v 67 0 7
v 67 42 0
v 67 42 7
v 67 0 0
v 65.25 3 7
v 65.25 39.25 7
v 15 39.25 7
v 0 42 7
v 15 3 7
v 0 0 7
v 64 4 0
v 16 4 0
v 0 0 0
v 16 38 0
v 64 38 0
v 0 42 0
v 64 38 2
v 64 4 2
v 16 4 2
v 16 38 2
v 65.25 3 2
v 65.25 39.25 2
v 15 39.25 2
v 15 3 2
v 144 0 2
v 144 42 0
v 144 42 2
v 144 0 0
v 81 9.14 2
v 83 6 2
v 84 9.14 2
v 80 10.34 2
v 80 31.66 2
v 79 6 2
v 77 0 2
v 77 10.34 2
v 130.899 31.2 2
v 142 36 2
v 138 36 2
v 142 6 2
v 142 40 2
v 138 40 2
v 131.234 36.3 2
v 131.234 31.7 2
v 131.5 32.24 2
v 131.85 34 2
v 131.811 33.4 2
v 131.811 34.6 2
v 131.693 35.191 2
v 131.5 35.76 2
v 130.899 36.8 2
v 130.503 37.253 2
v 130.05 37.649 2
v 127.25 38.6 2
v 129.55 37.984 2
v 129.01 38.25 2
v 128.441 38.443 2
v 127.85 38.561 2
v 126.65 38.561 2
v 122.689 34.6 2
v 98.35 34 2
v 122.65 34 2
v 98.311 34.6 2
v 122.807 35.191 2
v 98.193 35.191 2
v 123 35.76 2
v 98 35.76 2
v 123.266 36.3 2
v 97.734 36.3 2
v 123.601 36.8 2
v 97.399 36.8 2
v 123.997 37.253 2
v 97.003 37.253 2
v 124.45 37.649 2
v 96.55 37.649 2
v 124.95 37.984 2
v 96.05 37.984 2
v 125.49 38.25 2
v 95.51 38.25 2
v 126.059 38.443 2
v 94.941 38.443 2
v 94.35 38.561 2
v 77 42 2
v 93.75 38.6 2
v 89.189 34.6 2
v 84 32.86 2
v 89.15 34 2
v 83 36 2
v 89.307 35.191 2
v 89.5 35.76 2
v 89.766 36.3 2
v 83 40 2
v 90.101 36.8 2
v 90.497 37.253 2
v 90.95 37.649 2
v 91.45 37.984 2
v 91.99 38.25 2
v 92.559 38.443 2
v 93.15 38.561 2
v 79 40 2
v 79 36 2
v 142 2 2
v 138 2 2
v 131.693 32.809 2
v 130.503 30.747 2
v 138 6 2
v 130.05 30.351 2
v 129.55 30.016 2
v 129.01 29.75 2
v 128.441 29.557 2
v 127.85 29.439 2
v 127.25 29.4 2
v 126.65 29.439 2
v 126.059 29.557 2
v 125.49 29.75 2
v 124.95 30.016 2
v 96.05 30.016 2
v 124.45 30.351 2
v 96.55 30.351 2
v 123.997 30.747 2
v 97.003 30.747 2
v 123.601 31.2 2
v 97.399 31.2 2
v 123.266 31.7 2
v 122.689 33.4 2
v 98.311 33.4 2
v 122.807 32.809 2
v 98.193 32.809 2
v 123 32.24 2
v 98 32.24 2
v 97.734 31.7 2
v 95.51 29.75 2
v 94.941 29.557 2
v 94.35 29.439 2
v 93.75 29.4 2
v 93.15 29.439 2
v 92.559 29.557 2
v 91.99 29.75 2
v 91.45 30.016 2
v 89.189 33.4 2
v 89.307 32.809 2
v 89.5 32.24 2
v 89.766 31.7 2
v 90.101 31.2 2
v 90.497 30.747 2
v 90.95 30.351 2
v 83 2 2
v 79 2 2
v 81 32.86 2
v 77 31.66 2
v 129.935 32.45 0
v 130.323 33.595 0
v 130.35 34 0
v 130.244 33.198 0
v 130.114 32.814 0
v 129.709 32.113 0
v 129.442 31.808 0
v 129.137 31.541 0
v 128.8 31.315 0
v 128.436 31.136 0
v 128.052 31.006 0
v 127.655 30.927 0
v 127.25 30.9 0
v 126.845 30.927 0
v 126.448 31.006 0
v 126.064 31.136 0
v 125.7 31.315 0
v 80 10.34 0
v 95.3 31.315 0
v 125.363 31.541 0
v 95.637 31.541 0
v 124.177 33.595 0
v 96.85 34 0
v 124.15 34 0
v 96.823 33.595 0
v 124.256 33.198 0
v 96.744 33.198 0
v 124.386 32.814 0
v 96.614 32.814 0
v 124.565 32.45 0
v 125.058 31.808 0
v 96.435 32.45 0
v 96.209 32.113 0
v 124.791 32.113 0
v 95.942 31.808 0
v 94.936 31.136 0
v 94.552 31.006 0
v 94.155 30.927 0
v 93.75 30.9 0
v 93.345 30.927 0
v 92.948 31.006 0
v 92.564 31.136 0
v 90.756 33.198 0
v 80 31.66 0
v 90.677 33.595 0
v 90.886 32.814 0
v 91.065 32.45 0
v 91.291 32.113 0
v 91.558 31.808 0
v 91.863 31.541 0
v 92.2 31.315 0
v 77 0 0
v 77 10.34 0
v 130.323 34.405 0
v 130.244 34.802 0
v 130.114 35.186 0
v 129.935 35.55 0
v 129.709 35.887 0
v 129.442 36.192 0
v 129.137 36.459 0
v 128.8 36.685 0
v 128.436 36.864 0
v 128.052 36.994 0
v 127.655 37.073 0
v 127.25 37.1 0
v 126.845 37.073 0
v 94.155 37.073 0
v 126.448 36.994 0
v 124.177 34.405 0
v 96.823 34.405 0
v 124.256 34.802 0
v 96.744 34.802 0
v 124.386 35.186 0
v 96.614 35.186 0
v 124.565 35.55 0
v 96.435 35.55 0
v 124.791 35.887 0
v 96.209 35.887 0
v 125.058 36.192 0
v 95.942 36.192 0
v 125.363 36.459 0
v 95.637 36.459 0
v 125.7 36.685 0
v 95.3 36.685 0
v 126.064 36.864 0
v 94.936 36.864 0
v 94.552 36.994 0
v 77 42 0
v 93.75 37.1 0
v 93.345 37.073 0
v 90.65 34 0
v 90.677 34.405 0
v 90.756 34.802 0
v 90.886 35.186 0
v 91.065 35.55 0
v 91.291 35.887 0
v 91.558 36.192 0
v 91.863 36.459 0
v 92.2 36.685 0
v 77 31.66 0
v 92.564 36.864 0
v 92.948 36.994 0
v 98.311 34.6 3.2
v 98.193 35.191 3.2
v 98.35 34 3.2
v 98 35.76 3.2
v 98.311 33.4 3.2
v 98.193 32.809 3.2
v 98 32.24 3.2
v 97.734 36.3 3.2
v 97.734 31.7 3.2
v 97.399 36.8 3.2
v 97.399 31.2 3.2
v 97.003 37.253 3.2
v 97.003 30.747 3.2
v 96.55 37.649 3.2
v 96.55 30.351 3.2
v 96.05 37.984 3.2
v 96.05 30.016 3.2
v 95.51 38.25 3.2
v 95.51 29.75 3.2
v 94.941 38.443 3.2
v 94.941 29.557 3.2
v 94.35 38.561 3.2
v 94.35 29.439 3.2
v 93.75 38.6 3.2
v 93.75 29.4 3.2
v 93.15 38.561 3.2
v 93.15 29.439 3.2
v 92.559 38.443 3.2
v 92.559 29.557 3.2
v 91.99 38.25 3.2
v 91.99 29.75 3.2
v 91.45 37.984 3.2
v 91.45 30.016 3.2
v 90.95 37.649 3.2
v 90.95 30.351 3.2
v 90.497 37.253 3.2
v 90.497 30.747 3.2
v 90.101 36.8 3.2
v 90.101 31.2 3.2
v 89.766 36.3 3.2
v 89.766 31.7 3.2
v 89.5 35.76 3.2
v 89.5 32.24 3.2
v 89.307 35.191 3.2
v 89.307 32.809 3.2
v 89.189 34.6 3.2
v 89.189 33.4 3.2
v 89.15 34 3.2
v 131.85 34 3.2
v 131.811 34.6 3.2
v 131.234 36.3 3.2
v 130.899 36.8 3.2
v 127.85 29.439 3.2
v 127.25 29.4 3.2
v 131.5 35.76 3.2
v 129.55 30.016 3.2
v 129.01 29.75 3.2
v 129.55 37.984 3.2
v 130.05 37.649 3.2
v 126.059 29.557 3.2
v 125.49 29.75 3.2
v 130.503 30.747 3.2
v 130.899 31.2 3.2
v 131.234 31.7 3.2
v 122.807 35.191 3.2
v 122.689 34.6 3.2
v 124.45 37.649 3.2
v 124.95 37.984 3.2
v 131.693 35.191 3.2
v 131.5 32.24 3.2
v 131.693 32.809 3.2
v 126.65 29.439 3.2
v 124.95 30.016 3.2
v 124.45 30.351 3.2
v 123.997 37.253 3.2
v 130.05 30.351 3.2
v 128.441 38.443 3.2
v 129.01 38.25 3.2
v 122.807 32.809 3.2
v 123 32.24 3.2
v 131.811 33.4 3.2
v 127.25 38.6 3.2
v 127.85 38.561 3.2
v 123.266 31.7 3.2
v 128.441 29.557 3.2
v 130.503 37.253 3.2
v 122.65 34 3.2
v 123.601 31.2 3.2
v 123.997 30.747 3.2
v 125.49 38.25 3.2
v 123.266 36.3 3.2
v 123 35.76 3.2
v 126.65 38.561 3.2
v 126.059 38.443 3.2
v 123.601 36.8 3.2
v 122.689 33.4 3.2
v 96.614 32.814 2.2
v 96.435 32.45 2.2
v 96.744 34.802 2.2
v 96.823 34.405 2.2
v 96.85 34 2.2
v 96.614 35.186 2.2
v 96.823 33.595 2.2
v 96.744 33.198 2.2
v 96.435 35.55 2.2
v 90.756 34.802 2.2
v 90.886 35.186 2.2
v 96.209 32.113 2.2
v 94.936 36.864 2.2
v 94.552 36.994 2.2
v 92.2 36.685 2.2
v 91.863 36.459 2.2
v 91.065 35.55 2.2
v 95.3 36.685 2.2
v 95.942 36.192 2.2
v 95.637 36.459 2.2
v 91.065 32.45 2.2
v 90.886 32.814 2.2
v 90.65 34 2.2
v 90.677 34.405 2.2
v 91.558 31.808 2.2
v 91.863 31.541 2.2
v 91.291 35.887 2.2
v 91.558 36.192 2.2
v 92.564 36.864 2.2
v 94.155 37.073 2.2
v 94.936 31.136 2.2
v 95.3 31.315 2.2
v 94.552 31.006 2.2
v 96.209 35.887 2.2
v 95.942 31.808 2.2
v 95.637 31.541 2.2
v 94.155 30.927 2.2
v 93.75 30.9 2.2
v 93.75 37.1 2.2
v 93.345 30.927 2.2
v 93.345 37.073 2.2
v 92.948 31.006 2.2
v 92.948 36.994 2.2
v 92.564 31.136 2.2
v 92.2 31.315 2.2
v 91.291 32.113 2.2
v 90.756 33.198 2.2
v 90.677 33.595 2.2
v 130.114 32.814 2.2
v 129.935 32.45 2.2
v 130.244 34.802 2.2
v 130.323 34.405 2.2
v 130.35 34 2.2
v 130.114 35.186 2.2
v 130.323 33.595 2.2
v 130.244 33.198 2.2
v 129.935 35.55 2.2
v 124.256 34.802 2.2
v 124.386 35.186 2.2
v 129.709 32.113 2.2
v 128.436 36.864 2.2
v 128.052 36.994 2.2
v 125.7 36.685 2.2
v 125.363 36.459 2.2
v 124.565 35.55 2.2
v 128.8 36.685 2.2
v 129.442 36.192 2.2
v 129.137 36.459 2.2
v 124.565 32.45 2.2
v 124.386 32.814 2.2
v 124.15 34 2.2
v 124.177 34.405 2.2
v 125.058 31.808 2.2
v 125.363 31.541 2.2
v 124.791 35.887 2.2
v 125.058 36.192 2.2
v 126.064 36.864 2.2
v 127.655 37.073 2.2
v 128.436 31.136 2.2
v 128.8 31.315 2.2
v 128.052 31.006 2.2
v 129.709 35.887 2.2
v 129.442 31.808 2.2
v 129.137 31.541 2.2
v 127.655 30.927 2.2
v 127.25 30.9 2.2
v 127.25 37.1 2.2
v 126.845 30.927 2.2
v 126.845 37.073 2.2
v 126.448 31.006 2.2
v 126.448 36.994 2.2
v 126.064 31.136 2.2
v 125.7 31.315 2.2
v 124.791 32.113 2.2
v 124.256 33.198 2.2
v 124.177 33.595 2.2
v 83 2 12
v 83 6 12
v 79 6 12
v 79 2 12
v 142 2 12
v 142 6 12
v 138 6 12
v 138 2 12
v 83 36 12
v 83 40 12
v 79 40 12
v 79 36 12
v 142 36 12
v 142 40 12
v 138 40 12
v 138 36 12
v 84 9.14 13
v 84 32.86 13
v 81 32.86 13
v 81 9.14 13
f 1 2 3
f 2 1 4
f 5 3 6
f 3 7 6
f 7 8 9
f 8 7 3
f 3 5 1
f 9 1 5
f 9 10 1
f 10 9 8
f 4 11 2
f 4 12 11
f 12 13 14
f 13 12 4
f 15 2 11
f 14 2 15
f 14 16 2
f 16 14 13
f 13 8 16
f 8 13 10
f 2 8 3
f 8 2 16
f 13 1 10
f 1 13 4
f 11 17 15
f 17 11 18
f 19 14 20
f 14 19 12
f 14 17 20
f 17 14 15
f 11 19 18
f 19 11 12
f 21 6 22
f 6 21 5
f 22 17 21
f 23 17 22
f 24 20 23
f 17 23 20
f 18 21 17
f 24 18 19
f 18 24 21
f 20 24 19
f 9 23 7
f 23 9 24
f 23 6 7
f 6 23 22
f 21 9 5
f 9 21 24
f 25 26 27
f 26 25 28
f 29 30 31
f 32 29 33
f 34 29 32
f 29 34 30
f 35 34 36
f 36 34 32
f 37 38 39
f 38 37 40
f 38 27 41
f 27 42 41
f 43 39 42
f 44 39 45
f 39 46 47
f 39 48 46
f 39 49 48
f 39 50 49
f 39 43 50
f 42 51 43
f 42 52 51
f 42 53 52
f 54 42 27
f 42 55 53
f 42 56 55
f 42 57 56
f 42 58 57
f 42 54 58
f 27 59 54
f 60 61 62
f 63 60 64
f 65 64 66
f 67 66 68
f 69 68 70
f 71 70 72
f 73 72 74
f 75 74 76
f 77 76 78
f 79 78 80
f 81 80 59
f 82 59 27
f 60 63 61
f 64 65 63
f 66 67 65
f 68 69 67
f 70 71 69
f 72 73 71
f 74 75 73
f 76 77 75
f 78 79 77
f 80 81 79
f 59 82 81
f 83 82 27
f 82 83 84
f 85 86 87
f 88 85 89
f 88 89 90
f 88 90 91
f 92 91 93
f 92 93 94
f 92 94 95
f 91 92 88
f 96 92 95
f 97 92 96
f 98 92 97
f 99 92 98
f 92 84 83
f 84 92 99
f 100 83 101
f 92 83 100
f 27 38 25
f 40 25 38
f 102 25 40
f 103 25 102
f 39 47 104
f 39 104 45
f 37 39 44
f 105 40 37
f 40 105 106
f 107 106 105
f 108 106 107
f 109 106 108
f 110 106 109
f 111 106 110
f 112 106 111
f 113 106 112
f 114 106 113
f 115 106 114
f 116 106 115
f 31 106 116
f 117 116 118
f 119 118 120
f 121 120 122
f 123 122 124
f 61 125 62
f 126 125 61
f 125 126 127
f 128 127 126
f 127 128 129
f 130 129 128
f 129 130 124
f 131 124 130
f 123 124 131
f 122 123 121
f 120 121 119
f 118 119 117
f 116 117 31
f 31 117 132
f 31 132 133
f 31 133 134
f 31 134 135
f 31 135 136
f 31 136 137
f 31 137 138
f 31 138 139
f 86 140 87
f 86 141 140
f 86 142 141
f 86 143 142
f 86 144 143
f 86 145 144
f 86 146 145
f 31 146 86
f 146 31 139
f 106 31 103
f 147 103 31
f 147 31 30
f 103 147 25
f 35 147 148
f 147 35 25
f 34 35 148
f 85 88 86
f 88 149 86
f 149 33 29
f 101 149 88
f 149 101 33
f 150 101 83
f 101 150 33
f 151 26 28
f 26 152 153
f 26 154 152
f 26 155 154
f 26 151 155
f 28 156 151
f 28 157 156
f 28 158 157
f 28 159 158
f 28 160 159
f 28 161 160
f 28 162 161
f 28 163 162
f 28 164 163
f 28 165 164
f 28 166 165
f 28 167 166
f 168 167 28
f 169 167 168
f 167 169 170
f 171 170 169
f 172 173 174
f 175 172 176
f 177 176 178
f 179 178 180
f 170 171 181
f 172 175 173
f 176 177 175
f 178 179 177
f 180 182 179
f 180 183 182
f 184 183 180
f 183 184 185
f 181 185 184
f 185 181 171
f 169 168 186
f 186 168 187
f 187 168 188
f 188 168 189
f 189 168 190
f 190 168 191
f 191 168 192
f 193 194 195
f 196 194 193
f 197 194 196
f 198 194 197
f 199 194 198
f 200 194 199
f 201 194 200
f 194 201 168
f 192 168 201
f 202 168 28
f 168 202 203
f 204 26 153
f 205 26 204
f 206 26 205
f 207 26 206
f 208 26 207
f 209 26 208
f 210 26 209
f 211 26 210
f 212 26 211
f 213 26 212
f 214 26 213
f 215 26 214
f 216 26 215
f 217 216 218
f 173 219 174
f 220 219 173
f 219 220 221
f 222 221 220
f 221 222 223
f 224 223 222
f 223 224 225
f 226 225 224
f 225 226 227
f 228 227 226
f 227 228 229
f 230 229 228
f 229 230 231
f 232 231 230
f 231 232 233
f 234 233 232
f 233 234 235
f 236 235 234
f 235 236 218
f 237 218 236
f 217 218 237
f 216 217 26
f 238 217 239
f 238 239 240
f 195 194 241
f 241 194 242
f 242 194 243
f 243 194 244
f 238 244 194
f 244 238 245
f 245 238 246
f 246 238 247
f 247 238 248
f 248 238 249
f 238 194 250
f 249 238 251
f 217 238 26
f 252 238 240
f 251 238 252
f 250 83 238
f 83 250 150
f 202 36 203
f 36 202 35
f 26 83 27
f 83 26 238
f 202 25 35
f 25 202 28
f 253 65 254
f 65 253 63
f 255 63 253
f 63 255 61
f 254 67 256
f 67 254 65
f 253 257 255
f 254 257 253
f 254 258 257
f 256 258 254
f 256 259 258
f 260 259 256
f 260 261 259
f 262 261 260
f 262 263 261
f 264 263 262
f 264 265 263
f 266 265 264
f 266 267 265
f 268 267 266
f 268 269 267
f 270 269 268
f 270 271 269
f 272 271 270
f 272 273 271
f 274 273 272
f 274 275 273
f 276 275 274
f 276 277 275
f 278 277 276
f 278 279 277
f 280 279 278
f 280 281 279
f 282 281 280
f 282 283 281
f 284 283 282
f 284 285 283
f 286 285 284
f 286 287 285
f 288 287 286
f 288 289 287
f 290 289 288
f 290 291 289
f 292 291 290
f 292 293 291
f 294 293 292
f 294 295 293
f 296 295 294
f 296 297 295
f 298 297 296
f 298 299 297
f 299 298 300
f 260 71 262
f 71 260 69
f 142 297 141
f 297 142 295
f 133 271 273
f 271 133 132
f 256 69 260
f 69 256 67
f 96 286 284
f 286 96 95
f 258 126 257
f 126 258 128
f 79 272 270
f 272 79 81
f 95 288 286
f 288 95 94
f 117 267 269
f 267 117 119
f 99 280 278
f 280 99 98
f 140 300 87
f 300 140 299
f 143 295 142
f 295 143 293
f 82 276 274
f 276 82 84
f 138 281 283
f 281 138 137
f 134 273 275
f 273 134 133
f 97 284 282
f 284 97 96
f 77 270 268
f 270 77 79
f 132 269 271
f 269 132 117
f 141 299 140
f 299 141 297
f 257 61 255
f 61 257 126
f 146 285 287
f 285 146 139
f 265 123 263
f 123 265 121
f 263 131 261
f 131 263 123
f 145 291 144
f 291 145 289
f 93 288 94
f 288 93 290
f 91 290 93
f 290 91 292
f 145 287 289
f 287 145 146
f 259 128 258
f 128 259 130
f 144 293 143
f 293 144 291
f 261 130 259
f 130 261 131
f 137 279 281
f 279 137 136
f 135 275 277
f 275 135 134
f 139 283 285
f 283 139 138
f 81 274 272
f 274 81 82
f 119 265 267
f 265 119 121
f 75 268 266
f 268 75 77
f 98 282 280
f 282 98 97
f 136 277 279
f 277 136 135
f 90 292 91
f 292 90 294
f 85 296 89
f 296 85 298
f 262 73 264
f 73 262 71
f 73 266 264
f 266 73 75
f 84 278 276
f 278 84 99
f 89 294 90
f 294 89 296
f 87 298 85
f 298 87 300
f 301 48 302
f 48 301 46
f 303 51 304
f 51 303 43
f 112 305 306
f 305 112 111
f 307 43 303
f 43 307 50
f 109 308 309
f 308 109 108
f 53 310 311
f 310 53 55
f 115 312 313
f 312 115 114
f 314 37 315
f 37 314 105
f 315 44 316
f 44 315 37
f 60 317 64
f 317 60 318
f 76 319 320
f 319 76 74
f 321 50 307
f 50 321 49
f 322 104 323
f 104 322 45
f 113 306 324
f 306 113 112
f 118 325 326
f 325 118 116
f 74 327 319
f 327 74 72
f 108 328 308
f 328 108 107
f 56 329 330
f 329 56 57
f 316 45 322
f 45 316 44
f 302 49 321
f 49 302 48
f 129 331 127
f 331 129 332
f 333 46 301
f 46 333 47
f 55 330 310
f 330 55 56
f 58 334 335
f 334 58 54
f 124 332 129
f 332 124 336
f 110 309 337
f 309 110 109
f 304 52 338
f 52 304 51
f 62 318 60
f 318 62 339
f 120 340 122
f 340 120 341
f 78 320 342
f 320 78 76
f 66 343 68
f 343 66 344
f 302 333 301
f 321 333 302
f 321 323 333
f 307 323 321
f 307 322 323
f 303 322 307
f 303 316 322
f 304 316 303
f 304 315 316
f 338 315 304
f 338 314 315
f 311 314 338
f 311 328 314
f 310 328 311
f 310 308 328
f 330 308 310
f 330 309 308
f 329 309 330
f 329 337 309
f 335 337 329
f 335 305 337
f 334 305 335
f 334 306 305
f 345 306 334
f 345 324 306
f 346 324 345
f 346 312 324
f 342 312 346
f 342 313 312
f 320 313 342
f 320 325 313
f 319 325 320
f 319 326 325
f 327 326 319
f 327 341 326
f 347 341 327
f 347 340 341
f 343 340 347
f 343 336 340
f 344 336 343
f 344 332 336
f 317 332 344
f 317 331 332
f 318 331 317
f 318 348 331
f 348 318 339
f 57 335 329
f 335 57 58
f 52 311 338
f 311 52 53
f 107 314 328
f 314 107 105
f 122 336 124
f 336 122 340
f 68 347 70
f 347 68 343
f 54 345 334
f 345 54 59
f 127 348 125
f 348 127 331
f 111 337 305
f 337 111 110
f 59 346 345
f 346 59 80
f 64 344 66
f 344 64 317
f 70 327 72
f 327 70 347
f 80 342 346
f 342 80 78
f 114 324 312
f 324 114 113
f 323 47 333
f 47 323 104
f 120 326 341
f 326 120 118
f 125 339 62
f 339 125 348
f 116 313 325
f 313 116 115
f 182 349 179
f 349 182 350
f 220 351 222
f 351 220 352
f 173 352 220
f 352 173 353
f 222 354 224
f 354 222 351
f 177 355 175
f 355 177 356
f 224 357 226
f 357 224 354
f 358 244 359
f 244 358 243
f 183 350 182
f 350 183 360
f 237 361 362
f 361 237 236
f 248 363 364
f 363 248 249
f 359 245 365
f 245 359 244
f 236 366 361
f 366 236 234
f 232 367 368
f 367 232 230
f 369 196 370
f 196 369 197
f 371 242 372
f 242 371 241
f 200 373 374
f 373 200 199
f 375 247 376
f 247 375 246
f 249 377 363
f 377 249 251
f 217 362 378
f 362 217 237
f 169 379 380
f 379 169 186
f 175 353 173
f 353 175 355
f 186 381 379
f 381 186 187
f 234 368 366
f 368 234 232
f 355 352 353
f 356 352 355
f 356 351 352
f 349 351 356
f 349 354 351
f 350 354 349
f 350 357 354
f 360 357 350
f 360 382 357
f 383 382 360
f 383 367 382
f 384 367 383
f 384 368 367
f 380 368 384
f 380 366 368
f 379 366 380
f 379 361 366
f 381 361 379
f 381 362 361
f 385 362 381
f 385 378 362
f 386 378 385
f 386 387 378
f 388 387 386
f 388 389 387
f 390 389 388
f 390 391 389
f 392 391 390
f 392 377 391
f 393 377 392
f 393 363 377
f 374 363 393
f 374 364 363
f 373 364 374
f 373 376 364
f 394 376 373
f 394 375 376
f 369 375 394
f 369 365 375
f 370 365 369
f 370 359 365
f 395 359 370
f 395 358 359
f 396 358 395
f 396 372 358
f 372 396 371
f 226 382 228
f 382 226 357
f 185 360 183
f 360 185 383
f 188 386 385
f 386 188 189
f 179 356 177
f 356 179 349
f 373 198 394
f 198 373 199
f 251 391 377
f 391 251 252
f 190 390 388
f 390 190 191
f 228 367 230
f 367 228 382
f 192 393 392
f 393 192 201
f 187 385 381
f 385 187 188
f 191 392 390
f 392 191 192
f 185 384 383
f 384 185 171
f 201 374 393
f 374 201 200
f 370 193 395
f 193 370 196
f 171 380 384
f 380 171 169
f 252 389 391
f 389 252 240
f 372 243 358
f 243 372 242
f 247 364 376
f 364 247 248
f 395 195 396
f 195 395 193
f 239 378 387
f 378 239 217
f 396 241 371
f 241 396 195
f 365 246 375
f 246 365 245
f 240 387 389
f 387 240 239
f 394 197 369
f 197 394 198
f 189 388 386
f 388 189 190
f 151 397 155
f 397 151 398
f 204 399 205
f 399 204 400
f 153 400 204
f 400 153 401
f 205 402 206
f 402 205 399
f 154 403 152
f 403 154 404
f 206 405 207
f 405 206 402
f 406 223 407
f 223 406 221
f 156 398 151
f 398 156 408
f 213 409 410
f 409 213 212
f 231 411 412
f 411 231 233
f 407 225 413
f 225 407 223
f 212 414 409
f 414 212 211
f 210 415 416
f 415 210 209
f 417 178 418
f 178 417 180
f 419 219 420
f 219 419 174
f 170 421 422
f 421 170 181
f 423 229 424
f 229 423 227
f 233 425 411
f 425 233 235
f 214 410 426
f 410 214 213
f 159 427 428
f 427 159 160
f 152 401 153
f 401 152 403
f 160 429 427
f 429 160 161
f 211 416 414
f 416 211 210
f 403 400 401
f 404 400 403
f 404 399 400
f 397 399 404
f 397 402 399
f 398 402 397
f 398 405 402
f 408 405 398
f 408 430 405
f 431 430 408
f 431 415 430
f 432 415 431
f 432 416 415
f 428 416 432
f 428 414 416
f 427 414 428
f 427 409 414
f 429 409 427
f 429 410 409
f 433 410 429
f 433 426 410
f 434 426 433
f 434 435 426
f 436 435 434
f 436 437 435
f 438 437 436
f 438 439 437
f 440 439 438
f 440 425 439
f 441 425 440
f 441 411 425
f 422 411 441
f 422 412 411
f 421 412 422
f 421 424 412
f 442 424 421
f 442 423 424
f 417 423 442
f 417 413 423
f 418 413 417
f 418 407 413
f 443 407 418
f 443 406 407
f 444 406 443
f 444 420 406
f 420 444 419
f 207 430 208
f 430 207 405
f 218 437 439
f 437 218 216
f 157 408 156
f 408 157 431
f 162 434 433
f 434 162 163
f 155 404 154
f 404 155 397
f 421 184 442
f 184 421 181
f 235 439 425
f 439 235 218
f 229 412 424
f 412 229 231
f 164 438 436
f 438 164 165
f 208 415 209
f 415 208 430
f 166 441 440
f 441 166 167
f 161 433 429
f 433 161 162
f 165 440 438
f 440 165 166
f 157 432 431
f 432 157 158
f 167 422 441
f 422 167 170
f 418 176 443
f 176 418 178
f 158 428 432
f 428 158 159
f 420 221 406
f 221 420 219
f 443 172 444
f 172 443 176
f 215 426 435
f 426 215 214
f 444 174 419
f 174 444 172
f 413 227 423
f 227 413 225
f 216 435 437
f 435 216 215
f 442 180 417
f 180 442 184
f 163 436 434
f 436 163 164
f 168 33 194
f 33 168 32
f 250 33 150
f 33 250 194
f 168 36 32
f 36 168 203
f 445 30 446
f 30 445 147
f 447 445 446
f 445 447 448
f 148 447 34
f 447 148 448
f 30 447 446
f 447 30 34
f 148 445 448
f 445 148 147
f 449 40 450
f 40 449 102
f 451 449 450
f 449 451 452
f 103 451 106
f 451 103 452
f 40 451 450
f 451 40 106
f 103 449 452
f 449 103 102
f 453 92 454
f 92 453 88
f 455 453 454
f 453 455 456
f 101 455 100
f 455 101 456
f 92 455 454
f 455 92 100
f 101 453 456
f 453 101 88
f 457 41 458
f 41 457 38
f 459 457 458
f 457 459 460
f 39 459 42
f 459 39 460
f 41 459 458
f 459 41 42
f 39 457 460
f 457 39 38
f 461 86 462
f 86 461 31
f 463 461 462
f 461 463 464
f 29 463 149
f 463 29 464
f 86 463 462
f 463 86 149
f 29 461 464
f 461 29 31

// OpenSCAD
// ============================================================
// Part 2 — 2.0" ST7789V Screen Enclosure (Chassis HUD)
// ============================================================
// Two-piece enclosure (front bezel + back cover):
//   - front bezel: pocket recesses the LCD panel module (a 4mm-thick
//     assembly sitting proud of the PCB, not bare glass) flush with the
//     front face, with a slightly smaller through-window that laps over
//     the panel's front edge to retain it
//   - back cover: 2x press-fit neodymium magnet pockets, an internal
//     retention crossbar that clamps the 8-pin DuPont housing shoulders,
//     and a chamfered wire exit at the header edge
//
// Render:   openscad -o part2_display_enclosure.3mf part2_display_enclosure.scad
//
// Measurements below are calipered off the actual part (2026-09-29):
//   PCB footprint:  63 x 38mm            (display_pcb_w / display_pcb_h)
//   Total depth:    13mm, glass face to header-pin tips (display_total_depth)
//   LCD panel:      50 x 36 x 4mm, mounted on top of the PCB (panel_w/h/t)
// All confirmed — no VERIFY placeholders left in this file.
//
// One remaining ASSUMPTION, not measured: the panel sits within the PCB
// with only ~1mm clearance top/bottom (38-36) but ~13mm clearance
// width-wise (63-50) — that spare width has to be where the 8-pin header
// row lives, so the panel is modeled offset toward one end rather than
// centered, with the header/wire-exit zone reserved at the other end
// (`header_zone_w`). If the header actually runs along the long edge
// instead, flip `header_on_short_edge` below — everything derives from it.

$fn = 48;

tol = 0.25;

// ---- ST7789V module — confirmed measurements ----
display_pcb_w     = 63;
display_pcb_h     = 38;
display_total_depth = 13;      // glass face to header-pin tips
panel_w = 50;
panel_h = 36;
panel_t = 4;                   // LCD panel module height above the PCB

header_zone_w = display_pcb_w - panel_w;  // 13mm — reserved for the header row, see note above
retain_lip = 1;                            // front-face overlap that catches the panel's edge

// ---- 6x2mm neodymium magnets, press-fit ----
magnet_d = 6.2;
magnet_h = 2.2;
magnet_skin = 1;                       // solid roof left behind the magnet so it doesn't poke through
magnet_boss_wall = magnet_h + magnet_skin;  // local back-cover thickness under each magnet

// ---- 8-pin female DuPont housing (generic 2.54mm pitch, 1x8) ----
dupont_housing_w = 8 * 2.54 + 1;   // 8 pins at 2.54mm pitch + a little slack
crossbar_bite     = 1.2;           // how far the crossbar overlaps the housing shoulder

wall = 2;
// Standoff height has to clear the DuPont header pins protruding behind the
// PCB, not just lift the board a nominal amount: 13mm total depth - 4mm for
// the panel (which sits in FRONT, per the measurement) leaves ~9mm of stack
// behind the PCB (board thickness + header pin length). Undersizing this
// was the original mistake here — a 3mm standoff would have driven the
// header pins straight into the back cover.
standoff_h = display_total_depth - panel_t + 1;  // 10mm, +1mm clearance past the pins
post_w = 4;

shell_w = display_pcb_w + 2*wall;       // 67mm
shell_h_plan = display_pcb_h + 2*wall;  // 42mm
// Assembled depth = front_bezel thickness + standoff_h + back_cover wall
// = (wall+panel_t+1) + standoff_h + wall — comfortably exceeds the measured
// 13mm stack (~19mm), since front_bezel and back_cover each need their own
// wall thickness on top of the component clearance. Loose is fine here;
// crushing the header pins is not.

// panel position: offset away from the header zone, centered on the other axis
panel_x = wall + header_zone_w;
panel_y = wall + (display_pcb_h - panel_h) / 2;

// ============================================================
module front_bezel() {
    difference() {
        cube([shell_w, shell_h_plan, wall + panel_t + 1]);

        // visible window — slightly smaller than the panel so the front
        // face laps over the panel's edge by `retain_lip` and holds it in
        translate([panel_x + retain_lip, panel_y + retain_lip, -1])
            cube([panel_w - 2*retain_lip, panel_h - 2*retain_lip, wall + panel_t + 3]);

        // recessed pocket — full panel size, panel drops in from the front
        // and sits flush; wall thickness alone forms the retaining shoulder
        translate([panel_x, panel_y, wall])
            cube([panel_w + tol, panel_h + tol, panel_t + 1]);
    }
}

module magnet_boss_and_pocket(x, y) {
    // extra material on the inside face so the pocket doesn't cut through the thin back cover
    translate([x, y, wall])
        cylinder(d = magnet_d + 3, h = magnet_boss_wall - wall);
}

module back_cover() {
    magnet1 = [shell_w * 0.25, shell_h_plan - 8];
    magnet2 = [shell_w * 0.75, shell_h_plan - 8];

    difference() {
        union() {
            cube([shell_w, shell_h_plan, wall]);
            magnet_boss_and_pocket(magnet1[0], magnet1[1]);
            magnet_boss_and_pocket(magnet2[0], magnet2[1]);
        }

        // 2x magnet pockets, blind — cut from the outward-facing side, flush press-fit
        translate([magnet1[0], magnet1[1], -0.1])
            cylinder(d = magnet_d, h = magnet_h + 0.1);
        translate([magnet2[0], magnet2[1], -0.1])
            cylinder(d = magnet_d, h = magnet_h + 0.1);

        // chamfered wire exit — centered in the reserved header zone, at
        // the board edge nearest the header (X=0 end, where header_zone_w
        // was reserved)
        translate([-1, shell_h_plan/2 - dupont_housing_w/2, wall - 2])
            cube([wall + 2, dupont_housing_w, 2 + 1]);
    }

    // corner standoff posts for the display PCB
    for (pos = [[wall, wall], [shell_w - wall - post_w, wall],
                [wall, shell_h_plan - wall - post_w], [shell_w - wall - post_w, shell_h_plan - wall - post_w]])
        translate([pos[0], pos[1], wall])
            cube([post_w, post_w, standoff_h]);

    // internal retention crossbar — clamps against the DuPont housing shoulders
    // so cable tension can't walk the connector out of the pocket
    translate([wall + 2, shell_h_plan/2 - dupont_housing_w/2 - crossbar_bite, wall])
        cube([3, dupont_housing_w + 2*crossbar_bite, standoff_h + 1]);
}

// ---- layout for printing: bezel + cover side by side ----
front_bezel();
translate([shell_w + 10, 0, 0]) back_cover();
